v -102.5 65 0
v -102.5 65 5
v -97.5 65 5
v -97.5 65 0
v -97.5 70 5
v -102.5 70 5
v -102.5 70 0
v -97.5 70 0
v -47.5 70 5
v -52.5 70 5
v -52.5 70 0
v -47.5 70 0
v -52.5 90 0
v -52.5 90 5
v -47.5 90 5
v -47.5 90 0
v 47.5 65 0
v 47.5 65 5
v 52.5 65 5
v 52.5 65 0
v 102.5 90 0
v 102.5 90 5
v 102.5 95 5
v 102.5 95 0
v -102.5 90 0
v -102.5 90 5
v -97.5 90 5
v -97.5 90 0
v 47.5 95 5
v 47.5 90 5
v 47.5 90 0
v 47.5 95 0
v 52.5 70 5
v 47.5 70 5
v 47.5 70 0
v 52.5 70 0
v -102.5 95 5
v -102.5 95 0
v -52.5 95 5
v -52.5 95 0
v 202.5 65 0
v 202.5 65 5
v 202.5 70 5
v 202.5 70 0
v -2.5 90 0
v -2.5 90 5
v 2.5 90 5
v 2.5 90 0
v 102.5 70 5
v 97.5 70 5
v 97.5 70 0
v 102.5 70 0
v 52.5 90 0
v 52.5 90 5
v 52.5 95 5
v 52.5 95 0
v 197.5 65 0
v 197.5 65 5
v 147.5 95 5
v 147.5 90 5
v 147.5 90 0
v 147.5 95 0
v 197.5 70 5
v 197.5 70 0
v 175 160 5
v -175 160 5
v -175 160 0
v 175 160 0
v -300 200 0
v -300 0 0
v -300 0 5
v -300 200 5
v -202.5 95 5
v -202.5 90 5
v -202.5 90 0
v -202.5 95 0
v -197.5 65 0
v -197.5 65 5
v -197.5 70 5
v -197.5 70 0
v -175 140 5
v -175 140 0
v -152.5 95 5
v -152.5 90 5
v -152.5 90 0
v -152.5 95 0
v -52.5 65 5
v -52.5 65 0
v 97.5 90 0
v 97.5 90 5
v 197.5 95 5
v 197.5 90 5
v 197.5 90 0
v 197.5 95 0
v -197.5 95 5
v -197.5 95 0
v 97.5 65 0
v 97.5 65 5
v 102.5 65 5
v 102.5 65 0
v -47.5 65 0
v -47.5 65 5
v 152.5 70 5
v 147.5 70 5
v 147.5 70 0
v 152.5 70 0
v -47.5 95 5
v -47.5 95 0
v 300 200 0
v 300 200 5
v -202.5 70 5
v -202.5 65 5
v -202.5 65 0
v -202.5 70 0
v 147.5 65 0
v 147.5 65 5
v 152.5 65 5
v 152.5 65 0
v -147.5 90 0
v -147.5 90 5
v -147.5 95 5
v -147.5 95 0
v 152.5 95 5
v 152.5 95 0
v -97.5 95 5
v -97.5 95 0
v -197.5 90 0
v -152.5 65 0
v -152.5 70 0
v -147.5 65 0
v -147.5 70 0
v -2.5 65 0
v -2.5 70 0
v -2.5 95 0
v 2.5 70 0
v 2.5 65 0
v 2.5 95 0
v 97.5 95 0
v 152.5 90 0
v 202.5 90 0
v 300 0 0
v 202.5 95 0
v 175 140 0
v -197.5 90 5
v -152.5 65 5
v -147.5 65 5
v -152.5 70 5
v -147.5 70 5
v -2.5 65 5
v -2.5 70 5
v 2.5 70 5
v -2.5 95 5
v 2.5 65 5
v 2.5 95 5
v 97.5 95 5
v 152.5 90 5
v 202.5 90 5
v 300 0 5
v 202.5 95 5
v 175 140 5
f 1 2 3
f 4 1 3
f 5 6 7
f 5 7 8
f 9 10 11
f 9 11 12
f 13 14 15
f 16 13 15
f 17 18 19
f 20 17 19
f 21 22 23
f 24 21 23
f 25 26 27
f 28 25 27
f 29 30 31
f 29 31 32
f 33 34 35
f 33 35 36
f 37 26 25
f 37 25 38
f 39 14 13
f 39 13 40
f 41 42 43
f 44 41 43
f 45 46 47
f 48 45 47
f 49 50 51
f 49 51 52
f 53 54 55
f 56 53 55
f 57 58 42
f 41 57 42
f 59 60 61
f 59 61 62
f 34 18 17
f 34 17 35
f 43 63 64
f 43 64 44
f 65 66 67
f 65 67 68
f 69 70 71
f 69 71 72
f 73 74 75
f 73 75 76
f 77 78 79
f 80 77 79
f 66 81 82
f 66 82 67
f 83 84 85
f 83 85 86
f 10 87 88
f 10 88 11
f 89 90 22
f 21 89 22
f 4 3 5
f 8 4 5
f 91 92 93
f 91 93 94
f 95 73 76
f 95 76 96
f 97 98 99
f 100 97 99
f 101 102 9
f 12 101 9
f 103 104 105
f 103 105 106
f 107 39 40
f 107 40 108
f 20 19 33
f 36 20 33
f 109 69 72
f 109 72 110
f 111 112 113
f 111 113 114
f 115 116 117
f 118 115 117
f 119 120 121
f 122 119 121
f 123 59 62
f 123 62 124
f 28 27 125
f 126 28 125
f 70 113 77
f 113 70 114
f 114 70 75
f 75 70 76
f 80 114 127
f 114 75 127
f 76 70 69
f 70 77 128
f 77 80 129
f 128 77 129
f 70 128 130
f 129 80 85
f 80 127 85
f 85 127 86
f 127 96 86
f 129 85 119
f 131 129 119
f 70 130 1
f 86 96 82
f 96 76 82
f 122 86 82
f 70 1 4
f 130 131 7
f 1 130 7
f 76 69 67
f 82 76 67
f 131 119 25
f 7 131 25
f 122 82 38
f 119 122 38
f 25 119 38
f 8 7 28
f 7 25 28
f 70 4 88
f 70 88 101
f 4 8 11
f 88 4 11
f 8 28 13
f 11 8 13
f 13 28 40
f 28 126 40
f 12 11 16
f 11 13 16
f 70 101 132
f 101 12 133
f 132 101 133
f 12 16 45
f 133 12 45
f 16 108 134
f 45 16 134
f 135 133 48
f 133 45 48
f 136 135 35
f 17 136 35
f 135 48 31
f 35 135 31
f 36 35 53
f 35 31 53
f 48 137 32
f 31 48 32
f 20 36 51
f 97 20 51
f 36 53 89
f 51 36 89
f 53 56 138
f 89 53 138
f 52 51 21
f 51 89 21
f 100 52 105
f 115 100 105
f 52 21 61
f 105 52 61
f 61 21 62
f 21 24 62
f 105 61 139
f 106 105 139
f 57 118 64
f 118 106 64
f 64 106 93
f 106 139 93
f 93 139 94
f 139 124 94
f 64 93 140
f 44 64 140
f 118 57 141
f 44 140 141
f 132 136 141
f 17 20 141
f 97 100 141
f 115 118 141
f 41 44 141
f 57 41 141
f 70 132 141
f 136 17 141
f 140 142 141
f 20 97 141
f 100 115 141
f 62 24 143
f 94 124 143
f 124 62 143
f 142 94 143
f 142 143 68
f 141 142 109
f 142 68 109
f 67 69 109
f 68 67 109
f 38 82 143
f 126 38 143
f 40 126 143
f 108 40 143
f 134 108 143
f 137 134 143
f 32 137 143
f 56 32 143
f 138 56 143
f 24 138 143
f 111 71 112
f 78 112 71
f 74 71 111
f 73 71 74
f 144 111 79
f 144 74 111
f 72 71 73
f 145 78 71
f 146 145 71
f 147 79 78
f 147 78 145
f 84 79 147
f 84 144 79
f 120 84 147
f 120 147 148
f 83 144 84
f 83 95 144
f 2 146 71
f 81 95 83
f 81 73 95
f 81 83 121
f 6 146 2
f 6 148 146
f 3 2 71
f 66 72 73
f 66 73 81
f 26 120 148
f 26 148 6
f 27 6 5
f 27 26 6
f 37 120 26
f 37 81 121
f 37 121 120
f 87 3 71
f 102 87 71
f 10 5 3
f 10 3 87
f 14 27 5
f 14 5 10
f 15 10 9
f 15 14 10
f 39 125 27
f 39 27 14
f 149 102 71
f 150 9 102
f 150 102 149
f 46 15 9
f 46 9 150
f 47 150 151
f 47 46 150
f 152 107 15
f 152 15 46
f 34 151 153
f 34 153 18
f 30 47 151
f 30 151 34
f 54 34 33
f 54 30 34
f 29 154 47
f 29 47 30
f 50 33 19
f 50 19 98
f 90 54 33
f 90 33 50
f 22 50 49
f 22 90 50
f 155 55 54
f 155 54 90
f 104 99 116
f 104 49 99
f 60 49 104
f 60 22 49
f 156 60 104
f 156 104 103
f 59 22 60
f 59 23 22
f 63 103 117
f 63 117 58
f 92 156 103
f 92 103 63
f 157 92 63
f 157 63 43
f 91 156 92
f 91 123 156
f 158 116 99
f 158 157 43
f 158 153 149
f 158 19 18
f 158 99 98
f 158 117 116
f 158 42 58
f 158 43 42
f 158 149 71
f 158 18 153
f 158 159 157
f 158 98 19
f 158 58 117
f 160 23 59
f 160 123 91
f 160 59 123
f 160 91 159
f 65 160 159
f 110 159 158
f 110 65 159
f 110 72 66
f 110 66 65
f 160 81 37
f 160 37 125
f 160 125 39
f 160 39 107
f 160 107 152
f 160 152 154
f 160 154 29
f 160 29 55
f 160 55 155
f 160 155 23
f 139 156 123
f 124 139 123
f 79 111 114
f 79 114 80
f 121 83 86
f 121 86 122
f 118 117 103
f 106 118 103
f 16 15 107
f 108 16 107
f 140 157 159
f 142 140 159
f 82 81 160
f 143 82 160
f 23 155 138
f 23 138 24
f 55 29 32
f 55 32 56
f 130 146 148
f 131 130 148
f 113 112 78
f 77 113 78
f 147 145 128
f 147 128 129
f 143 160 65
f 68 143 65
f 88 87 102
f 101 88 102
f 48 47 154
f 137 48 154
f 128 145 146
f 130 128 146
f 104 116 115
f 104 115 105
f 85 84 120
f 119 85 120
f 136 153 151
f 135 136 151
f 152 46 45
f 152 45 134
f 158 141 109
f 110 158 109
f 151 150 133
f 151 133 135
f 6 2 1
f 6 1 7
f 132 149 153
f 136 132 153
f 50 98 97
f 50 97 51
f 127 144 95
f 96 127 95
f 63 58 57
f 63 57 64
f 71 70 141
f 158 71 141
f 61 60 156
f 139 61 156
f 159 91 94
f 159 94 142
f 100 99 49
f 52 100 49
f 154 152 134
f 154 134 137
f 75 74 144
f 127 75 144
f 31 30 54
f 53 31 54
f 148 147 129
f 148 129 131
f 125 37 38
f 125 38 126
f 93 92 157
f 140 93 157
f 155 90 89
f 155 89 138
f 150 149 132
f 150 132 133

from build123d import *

# Parameters (mm, degrees)
SKETCH1_W           = 600
SKETCH1_H           = 200
EXTRUDE1_DEPTH      = 5
CUT_EXTRUDE1_REACH  = 362.59
SKETCH2_W           = 350
SKETCH2_H           = 20
CUT_EXTRUDE2_REACH  = 362.59
SKETCH4_W           = 5
SKETCH4_H           = 5
LPATTERN4_COUNT     = 5
LPATTERN4_PITCH     = 50
LPATTERN4_COL_COUNT = 5
LPATTERN4_COL_PITCH = 50


with BuildPart() as part:
    # Sketch1 → Extrude1 (new body)
    with BuildSketch(Plane.XY):
        with Locations((0, 100)):
            Rectangle(SKETCH1_W, SKETCH1_H)
    extrude(amount=EXTRUDE1_DEPTH)

    # Sketch2 → Cut-Extrude1 (cut, up to next)
    with BuildSketch(Plane.XY.offset(5), mode=Mode.PRIVATE) as cut_extrude1_sk1:
        with Locations((0, 150)):
            Rectangle(SKETCH2_W, SKETCH2_H)
    cut_extrude1_tool1 = extrude(cut_extrude1_sk1.sketch, amount=-CUT_EXTRUDE1_REACH, mode=Mode.PRIVATE) & part.part
    add(cut_extrude1_tool1.solids().sort_by_distance((0, 150, 5))[0], mode=Mode.SUBTRACT)

    # Sketch4 → Cut-Extrude2 (cut, up to next)
    with BuildSketch(Plane.XY.offset(5), mode=Mode.PRIVATE) as cut_extrude2_sk1:
        with Locations((0, 67.5)):
            Rectangle(SKETCH4_W, SKETCH4_H)
    cut_extrude2_tool1 = extrude(cut_extrude2_sk1.sketch, amount=-CUT_EXTRUDE2_REACH, mode=Mode.PRIVATE) & part.part
    # Sketch4 → Cut-Extrude2 (cut, up to next)
    with BuildSketch(Plane.XY.offset(5), mode=Mode.PRIVATE) as cut_extrude2_sk2:
        with Locations((0, 92.5)):
            Rectangle(SKETCH4_W, SKETCH4_H)
    cut_extrude2_tool2 = extrude(cut_extrude2_sk2.sketch, amount=-CUT_EXTRUDE2_REACH, mode=Mode.PRIVATE) & part.part
    cut_extrude2_1 = cut_extrude2_tool1.solids().sort_by_distance((0, 67.5, 5))[0]
    add(cut_extrude2_1, mode=Mode.SUBTRACT)
    cut_extrude2_2 = cut_extrude2_tool2.solids().sort_by_distance((0, 92.5, 5))[0]
    add(cut_extrude2_2, mode=Mode.SUBTRACT)
    cut_extrude2 = cut_extrude2_1 + cut_extrude2_2  # Cut-Extrude2 as one shape, for the pattern or mirror that repeats it

    # LPattern4: Cut-Extrude2 ×5
    with Locations(*[(-i * LPATTERN4_PITCH, 0, 0) for i in range(1, LPATTERN4_COUNT)]):
        add(cut_extrude2, mode=Mode.SUBTRACT)

    # LPattern4 col: Cut-Extrude2 ×5
    with Locations(*[(i * LPATTERN4_COL_PITCH, 0, 0) for i in range(1, LPATTERN4_COL_COUNT)]):
        add(cut_extrude2, mode=Mode.SUBTRACT)


solid = part.part
